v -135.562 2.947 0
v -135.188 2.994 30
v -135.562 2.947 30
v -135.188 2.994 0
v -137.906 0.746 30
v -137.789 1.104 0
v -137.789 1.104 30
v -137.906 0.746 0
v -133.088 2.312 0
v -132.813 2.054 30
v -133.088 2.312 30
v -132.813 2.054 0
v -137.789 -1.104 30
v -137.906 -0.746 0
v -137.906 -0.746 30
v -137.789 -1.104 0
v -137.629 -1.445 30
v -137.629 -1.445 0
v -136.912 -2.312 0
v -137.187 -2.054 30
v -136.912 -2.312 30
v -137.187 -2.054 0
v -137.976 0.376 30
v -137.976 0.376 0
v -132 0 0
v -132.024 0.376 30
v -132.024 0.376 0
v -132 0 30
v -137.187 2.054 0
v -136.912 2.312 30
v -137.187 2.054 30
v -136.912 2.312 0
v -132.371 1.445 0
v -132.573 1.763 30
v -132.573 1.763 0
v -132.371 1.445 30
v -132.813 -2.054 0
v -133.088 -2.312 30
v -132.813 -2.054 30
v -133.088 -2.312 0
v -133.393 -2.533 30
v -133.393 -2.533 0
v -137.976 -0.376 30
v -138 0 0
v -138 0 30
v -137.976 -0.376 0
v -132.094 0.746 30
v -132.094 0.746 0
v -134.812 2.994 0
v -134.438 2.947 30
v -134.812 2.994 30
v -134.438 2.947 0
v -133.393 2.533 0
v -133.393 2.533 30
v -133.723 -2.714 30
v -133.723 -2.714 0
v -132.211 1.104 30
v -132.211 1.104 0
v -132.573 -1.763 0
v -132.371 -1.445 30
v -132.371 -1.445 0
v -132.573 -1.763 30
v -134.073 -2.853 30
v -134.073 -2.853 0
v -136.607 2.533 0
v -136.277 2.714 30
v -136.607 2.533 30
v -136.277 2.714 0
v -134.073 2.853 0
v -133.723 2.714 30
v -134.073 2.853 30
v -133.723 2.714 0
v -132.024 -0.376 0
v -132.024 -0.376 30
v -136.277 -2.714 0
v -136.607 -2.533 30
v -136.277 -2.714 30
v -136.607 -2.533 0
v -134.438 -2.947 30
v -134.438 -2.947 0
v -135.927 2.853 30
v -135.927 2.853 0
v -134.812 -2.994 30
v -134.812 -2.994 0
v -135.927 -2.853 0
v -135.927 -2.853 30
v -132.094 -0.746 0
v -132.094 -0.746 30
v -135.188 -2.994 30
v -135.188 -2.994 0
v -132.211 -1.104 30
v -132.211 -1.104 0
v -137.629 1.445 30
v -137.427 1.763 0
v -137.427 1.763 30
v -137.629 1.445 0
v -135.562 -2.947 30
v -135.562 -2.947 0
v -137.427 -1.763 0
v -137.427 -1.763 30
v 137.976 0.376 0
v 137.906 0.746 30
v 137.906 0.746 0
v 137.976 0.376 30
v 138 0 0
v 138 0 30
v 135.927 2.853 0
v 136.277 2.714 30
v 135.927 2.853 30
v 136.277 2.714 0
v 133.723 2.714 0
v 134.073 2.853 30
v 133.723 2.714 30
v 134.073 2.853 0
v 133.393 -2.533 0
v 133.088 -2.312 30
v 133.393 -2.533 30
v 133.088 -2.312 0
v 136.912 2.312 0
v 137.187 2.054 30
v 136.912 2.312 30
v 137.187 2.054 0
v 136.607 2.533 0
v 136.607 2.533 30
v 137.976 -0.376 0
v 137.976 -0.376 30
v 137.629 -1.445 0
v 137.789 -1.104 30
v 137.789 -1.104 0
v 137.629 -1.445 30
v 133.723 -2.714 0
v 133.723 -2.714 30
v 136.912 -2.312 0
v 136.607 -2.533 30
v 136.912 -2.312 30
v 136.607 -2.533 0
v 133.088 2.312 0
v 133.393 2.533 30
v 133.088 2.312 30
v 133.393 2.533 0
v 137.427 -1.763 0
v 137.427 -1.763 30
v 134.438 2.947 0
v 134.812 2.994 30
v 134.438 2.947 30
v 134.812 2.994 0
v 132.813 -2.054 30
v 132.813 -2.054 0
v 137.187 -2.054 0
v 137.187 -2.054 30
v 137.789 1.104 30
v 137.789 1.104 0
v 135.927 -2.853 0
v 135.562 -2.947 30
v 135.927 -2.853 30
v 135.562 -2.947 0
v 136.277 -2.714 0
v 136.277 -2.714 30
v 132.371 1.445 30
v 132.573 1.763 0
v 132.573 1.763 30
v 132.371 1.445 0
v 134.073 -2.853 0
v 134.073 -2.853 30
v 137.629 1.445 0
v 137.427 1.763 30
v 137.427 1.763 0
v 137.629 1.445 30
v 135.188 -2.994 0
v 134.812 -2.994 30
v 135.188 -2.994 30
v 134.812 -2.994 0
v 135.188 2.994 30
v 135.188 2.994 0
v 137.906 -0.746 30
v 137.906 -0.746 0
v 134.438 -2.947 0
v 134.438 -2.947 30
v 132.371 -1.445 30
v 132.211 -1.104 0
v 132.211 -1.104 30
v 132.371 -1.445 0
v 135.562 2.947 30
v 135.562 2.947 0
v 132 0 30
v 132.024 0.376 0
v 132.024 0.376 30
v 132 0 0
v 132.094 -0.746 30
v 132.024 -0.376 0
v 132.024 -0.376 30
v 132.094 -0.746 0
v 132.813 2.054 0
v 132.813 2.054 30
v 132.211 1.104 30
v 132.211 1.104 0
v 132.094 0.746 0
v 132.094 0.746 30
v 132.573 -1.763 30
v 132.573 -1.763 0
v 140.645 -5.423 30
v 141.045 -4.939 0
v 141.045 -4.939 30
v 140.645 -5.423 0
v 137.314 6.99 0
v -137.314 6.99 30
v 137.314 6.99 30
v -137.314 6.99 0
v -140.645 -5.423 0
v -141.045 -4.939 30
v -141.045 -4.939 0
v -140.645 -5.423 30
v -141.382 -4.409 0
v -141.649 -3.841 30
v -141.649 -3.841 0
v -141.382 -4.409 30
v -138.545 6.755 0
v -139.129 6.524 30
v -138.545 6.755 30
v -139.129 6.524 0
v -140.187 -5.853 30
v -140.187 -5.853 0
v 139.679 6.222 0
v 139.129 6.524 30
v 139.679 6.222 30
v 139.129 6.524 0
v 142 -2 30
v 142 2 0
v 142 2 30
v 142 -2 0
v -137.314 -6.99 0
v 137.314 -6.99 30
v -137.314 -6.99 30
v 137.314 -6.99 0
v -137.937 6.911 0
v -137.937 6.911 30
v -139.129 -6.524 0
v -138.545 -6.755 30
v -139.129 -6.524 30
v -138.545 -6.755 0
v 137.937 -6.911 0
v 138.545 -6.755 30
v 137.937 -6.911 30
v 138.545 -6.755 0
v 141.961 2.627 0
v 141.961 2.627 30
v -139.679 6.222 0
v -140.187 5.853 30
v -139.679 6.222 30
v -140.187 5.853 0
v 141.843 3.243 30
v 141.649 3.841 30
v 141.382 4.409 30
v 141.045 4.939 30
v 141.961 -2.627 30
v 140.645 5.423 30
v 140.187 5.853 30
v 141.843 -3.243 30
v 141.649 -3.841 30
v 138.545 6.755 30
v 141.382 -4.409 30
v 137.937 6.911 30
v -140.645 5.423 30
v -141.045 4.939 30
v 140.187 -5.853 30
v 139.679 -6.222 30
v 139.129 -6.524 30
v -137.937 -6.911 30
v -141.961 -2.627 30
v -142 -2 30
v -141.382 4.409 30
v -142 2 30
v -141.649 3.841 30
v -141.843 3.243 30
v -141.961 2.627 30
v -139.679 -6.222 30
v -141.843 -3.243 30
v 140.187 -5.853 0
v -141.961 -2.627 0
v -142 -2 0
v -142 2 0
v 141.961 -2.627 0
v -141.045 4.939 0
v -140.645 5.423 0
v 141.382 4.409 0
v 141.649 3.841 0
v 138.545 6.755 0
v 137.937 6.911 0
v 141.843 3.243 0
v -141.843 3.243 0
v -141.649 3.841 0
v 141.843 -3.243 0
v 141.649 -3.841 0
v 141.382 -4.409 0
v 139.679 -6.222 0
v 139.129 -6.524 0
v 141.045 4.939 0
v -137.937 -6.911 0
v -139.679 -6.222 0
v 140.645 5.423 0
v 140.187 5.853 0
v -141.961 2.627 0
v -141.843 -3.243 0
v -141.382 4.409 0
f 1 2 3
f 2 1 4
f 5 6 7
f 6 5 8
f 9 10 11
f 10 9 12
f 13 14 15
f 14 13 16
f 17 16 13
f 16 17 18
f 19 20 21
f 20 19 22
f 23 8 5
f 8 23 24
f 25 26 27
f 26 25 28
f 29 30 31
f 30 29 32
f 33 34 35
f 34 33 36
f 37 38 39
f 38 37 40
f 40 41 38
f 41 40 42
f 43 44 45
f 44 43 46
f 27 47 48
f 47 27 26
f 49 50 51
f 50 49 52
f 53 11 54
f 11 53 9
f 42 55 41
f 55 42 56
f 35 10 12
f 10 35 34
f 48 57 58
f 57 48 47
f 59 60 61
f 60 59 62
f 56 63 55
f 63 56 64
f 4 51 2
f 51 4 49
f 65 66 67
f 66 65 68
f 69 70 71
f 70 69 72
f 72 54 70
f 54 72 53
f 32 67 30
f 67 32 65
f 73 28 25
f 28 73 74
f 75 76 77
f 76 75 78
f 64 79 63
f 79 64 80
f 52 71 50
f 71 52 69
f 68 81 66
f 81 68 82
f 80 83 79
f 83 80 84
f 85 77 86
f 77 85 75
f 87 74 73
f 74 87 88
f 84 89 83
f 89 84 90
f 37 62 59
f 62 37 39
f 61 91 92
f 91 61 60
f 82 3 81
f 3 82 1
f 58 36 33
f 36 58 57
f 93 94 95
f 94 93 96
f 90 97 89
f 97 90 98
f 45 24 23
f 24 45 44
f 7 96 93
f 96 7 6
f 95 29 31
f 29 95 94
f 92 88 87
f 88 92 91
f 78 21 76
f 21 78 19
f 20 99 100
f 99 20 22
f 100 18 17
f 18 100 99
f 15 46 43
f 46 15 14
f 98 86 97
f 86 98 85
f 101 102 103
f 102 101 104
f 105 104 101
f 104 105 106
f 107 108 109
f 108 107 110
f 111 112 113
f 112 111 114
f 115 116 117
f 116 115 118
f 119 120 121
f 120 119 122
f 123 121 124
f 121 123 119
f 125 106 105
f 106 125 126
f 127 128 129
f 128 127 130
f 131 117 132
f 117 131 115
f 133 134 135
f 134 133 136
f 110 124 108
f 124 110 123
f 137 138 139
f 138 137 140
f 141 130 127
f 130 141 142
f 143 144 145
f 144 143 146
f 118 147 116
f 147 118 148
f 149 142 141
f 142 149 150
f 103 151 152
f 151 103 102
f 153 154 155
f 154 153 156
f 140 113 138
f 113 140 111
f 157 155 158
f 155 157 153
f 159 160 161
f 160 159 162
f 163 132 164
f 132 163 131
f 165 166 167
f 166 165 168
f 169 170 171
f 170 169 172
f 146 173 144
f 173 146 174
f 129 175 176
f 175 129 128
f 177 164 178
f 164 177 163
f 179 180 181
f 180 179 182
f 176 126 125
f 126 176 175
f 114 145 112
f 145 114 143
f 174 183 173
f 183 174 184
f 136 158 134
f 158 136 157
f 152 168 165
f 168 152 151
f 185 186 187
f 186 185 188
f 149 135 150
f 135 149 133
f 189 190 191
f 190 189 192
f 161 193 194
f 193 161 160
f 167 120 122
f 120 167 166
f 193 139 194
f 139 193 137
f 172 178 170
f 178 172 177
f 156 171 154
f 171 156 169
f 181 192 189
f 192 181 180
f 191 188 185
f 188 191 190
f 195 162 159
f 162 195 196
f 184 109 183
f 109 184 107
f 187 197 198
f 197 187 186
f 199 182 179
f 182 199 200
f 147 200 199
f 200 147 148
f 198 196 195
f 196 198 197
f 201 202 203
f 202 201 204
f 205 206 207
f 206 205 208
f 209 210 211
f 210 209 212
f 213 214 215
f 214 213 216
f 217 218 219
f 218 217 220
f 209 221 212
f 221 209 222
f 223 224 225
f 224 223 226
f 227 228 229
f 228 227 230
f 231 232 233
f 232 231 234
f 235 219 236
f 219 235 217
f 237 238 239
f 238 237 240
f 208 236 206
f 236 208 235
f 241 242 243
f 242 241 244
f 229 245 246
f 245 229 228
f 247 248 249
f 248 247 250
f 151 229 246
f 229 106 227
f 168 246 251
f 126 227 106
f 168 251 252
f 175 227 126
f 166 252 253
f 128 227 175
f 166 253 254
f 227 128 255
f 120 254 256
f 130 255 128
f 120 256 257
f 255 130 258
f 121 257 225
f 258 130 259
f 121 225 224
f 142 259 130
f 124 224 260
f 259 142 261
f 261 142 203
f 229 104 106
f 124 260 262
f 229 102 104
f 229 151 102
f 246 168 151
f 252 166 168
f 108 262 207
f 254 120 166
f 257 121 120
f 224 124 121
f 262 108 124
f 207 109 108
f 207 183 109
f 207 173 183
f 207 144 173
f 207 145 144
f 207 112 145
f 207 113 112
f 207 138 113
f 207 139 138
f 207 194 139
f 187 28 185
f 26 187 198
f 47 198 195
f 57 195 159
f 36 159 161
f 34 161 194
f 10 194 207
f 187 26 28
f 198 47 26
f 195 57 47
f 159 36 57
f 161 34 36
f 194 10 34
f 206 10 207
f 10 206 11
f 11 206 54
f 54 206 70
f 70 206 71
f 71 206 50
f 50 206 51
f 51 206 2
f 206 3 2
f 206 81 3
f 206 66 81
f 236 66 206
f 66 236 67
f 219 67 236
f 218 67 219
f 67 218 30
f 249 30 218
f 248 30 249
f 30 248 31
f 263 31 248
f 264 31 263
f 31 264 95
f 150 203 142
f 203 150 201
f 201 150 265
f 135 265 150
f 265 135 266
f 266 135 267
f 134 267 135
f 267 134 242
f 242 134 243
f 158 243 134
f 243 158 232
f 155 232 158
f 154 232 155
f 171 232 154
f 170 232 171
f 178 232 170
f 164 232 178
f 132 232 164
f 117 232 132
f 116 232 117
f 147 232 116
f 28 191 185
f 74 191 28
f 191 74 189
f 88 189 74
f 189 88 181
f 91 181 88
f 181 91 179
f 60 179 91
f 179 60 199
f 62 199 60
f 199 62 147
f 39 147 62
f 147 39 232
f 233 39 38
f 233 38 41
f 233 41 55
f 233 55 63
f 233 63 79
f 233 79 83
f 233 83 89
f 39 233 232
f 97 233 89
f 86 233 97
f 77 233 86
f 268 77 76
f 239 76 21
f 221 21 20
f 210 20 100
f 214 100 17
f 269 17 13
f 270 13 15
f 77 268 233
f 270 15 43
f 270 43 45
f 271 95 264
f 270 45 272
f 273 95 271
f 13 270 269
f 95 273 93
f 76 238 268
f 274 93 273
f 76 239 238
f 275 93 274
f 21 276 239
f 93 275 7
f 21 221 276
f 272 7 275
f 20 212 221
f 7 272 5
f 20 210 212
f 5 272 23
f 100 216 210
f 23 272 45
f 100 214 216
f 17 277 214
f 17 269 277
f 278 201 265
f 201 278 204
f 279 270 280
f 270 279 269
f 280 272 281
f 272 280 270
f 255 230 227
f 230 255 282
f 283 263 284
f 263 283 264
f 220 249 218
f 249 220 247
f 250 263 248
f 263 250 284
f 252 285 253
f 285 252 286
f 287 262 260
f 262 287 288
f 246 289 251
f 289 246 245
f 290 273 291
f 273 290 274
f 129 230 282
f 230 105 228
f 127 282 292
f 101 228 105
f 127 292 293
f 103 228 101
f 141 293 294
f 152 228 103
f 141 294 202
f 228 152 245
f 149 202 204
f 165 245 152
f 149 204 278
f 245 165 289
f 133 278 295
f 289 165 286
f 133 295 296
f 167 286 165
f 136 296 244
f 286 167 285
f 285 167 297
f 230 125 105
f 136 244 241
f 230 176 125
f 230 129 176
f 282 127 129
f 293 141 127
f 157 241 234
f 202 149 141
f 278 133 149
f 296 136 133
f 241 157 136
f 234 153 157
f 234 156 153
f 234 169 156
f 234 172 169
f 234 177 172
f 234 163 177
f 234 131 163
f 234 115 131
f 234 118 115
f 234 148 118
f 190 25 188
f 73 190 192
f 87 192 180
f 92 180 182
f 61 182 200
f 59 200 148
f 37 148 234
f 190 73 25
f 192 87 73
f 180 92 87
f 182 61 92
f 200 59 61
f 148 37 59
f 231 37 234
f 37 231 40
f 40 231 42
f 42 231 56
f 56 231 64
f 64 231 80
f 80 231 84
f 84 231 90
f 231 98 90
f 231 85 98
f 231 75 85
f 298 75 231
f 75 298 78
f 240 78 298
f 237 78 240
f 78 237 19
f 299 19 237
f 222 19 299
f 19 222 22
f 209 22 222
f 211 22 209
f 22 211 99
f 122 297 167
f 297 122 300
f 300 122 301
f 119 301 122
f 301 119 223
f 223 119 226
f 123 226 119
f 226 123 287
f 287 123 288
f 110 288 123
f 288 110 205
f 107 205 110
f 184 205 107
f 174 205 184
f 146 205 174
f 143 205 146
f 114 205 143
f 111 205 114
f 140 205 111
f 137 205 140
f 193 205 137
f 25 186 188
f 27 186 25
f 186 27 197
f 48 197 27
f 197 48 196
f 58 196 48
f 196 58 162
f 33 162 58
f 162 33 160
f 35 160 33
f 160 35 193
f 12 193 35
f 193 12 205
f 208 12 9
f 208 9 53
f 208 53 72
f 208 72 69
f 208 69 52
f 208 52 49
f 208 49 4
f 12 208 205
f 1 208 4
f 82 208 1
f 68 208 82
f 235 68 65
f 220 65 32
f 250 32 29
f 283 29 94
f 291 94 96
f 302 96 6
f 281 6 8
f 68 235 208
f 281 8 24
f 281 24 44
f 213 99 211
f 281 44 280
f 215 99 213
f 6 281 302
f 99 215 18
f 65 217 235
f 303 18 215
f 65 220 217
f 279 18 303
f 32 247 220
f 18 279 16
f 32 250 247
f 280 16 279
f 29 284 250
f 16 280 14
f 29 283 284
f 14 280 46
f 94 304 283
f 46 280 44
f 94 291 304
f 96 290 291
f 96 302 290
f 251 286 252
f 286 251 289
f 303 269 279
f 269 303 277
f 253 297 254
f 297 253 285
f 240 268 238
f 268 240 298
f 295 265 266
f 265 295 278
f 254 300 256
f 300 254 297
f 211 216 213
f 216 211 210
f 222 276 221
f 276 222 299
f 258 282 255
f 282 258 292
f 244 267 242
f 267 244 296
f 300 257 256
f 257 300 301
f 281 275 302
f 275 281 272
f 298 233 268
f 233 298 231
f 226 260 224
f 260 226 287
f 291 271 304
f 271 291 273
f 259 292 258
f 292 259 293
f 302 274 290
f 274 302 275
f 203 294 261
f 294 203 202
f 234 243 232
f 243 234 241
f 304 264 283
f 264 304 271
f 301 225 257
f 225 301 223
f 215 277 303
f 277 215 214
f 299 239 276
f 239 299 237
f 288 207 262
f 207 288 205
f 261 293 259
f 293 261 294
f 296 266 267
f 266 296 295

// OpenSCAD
$fn = 50;


difference() {
	union() {
		hull() {
			translate(v = [-137.0000000000, 2.0000000000, 0]) {
				cylinder(h = 30, r = 5);
			}
			translate(v = [137.0000000000, 2.0000000000, 0]) {
				cylinder(h = 30, r = 5);
			}
			translate(v = [-137.0000000000, -2.0000000000, 0]) {
				cylinder(h = 30, r = 5);
			}
			translate(v = [137.0000000000, -2.0000000000, 0]) {
				cylinder(h = 30, r = 5);
			}
		}
	}
	union() {
		translate(v = [-135.0000000000, 0.0000000000, -100.0000000000]) {
			cylinder(h = 200, r = 3.0000000000);
		}
		translate(v = [-135.0000000000, 0.0000000000, -100.0000000000]) {
			cylinder(h = 200, r = 3.0000000000);
		}
		translate(v = [135.0000000000, 0.0000000000, -100.0000000000]) {
			cylinder(h = 200, r = 3.0000000000);
		}
		translate(v = [135.0000000000, 0.0000000000, -100.0000000000]) {
			cylinder(h = 200, r = 3.0000000000);
		}
	}
}
